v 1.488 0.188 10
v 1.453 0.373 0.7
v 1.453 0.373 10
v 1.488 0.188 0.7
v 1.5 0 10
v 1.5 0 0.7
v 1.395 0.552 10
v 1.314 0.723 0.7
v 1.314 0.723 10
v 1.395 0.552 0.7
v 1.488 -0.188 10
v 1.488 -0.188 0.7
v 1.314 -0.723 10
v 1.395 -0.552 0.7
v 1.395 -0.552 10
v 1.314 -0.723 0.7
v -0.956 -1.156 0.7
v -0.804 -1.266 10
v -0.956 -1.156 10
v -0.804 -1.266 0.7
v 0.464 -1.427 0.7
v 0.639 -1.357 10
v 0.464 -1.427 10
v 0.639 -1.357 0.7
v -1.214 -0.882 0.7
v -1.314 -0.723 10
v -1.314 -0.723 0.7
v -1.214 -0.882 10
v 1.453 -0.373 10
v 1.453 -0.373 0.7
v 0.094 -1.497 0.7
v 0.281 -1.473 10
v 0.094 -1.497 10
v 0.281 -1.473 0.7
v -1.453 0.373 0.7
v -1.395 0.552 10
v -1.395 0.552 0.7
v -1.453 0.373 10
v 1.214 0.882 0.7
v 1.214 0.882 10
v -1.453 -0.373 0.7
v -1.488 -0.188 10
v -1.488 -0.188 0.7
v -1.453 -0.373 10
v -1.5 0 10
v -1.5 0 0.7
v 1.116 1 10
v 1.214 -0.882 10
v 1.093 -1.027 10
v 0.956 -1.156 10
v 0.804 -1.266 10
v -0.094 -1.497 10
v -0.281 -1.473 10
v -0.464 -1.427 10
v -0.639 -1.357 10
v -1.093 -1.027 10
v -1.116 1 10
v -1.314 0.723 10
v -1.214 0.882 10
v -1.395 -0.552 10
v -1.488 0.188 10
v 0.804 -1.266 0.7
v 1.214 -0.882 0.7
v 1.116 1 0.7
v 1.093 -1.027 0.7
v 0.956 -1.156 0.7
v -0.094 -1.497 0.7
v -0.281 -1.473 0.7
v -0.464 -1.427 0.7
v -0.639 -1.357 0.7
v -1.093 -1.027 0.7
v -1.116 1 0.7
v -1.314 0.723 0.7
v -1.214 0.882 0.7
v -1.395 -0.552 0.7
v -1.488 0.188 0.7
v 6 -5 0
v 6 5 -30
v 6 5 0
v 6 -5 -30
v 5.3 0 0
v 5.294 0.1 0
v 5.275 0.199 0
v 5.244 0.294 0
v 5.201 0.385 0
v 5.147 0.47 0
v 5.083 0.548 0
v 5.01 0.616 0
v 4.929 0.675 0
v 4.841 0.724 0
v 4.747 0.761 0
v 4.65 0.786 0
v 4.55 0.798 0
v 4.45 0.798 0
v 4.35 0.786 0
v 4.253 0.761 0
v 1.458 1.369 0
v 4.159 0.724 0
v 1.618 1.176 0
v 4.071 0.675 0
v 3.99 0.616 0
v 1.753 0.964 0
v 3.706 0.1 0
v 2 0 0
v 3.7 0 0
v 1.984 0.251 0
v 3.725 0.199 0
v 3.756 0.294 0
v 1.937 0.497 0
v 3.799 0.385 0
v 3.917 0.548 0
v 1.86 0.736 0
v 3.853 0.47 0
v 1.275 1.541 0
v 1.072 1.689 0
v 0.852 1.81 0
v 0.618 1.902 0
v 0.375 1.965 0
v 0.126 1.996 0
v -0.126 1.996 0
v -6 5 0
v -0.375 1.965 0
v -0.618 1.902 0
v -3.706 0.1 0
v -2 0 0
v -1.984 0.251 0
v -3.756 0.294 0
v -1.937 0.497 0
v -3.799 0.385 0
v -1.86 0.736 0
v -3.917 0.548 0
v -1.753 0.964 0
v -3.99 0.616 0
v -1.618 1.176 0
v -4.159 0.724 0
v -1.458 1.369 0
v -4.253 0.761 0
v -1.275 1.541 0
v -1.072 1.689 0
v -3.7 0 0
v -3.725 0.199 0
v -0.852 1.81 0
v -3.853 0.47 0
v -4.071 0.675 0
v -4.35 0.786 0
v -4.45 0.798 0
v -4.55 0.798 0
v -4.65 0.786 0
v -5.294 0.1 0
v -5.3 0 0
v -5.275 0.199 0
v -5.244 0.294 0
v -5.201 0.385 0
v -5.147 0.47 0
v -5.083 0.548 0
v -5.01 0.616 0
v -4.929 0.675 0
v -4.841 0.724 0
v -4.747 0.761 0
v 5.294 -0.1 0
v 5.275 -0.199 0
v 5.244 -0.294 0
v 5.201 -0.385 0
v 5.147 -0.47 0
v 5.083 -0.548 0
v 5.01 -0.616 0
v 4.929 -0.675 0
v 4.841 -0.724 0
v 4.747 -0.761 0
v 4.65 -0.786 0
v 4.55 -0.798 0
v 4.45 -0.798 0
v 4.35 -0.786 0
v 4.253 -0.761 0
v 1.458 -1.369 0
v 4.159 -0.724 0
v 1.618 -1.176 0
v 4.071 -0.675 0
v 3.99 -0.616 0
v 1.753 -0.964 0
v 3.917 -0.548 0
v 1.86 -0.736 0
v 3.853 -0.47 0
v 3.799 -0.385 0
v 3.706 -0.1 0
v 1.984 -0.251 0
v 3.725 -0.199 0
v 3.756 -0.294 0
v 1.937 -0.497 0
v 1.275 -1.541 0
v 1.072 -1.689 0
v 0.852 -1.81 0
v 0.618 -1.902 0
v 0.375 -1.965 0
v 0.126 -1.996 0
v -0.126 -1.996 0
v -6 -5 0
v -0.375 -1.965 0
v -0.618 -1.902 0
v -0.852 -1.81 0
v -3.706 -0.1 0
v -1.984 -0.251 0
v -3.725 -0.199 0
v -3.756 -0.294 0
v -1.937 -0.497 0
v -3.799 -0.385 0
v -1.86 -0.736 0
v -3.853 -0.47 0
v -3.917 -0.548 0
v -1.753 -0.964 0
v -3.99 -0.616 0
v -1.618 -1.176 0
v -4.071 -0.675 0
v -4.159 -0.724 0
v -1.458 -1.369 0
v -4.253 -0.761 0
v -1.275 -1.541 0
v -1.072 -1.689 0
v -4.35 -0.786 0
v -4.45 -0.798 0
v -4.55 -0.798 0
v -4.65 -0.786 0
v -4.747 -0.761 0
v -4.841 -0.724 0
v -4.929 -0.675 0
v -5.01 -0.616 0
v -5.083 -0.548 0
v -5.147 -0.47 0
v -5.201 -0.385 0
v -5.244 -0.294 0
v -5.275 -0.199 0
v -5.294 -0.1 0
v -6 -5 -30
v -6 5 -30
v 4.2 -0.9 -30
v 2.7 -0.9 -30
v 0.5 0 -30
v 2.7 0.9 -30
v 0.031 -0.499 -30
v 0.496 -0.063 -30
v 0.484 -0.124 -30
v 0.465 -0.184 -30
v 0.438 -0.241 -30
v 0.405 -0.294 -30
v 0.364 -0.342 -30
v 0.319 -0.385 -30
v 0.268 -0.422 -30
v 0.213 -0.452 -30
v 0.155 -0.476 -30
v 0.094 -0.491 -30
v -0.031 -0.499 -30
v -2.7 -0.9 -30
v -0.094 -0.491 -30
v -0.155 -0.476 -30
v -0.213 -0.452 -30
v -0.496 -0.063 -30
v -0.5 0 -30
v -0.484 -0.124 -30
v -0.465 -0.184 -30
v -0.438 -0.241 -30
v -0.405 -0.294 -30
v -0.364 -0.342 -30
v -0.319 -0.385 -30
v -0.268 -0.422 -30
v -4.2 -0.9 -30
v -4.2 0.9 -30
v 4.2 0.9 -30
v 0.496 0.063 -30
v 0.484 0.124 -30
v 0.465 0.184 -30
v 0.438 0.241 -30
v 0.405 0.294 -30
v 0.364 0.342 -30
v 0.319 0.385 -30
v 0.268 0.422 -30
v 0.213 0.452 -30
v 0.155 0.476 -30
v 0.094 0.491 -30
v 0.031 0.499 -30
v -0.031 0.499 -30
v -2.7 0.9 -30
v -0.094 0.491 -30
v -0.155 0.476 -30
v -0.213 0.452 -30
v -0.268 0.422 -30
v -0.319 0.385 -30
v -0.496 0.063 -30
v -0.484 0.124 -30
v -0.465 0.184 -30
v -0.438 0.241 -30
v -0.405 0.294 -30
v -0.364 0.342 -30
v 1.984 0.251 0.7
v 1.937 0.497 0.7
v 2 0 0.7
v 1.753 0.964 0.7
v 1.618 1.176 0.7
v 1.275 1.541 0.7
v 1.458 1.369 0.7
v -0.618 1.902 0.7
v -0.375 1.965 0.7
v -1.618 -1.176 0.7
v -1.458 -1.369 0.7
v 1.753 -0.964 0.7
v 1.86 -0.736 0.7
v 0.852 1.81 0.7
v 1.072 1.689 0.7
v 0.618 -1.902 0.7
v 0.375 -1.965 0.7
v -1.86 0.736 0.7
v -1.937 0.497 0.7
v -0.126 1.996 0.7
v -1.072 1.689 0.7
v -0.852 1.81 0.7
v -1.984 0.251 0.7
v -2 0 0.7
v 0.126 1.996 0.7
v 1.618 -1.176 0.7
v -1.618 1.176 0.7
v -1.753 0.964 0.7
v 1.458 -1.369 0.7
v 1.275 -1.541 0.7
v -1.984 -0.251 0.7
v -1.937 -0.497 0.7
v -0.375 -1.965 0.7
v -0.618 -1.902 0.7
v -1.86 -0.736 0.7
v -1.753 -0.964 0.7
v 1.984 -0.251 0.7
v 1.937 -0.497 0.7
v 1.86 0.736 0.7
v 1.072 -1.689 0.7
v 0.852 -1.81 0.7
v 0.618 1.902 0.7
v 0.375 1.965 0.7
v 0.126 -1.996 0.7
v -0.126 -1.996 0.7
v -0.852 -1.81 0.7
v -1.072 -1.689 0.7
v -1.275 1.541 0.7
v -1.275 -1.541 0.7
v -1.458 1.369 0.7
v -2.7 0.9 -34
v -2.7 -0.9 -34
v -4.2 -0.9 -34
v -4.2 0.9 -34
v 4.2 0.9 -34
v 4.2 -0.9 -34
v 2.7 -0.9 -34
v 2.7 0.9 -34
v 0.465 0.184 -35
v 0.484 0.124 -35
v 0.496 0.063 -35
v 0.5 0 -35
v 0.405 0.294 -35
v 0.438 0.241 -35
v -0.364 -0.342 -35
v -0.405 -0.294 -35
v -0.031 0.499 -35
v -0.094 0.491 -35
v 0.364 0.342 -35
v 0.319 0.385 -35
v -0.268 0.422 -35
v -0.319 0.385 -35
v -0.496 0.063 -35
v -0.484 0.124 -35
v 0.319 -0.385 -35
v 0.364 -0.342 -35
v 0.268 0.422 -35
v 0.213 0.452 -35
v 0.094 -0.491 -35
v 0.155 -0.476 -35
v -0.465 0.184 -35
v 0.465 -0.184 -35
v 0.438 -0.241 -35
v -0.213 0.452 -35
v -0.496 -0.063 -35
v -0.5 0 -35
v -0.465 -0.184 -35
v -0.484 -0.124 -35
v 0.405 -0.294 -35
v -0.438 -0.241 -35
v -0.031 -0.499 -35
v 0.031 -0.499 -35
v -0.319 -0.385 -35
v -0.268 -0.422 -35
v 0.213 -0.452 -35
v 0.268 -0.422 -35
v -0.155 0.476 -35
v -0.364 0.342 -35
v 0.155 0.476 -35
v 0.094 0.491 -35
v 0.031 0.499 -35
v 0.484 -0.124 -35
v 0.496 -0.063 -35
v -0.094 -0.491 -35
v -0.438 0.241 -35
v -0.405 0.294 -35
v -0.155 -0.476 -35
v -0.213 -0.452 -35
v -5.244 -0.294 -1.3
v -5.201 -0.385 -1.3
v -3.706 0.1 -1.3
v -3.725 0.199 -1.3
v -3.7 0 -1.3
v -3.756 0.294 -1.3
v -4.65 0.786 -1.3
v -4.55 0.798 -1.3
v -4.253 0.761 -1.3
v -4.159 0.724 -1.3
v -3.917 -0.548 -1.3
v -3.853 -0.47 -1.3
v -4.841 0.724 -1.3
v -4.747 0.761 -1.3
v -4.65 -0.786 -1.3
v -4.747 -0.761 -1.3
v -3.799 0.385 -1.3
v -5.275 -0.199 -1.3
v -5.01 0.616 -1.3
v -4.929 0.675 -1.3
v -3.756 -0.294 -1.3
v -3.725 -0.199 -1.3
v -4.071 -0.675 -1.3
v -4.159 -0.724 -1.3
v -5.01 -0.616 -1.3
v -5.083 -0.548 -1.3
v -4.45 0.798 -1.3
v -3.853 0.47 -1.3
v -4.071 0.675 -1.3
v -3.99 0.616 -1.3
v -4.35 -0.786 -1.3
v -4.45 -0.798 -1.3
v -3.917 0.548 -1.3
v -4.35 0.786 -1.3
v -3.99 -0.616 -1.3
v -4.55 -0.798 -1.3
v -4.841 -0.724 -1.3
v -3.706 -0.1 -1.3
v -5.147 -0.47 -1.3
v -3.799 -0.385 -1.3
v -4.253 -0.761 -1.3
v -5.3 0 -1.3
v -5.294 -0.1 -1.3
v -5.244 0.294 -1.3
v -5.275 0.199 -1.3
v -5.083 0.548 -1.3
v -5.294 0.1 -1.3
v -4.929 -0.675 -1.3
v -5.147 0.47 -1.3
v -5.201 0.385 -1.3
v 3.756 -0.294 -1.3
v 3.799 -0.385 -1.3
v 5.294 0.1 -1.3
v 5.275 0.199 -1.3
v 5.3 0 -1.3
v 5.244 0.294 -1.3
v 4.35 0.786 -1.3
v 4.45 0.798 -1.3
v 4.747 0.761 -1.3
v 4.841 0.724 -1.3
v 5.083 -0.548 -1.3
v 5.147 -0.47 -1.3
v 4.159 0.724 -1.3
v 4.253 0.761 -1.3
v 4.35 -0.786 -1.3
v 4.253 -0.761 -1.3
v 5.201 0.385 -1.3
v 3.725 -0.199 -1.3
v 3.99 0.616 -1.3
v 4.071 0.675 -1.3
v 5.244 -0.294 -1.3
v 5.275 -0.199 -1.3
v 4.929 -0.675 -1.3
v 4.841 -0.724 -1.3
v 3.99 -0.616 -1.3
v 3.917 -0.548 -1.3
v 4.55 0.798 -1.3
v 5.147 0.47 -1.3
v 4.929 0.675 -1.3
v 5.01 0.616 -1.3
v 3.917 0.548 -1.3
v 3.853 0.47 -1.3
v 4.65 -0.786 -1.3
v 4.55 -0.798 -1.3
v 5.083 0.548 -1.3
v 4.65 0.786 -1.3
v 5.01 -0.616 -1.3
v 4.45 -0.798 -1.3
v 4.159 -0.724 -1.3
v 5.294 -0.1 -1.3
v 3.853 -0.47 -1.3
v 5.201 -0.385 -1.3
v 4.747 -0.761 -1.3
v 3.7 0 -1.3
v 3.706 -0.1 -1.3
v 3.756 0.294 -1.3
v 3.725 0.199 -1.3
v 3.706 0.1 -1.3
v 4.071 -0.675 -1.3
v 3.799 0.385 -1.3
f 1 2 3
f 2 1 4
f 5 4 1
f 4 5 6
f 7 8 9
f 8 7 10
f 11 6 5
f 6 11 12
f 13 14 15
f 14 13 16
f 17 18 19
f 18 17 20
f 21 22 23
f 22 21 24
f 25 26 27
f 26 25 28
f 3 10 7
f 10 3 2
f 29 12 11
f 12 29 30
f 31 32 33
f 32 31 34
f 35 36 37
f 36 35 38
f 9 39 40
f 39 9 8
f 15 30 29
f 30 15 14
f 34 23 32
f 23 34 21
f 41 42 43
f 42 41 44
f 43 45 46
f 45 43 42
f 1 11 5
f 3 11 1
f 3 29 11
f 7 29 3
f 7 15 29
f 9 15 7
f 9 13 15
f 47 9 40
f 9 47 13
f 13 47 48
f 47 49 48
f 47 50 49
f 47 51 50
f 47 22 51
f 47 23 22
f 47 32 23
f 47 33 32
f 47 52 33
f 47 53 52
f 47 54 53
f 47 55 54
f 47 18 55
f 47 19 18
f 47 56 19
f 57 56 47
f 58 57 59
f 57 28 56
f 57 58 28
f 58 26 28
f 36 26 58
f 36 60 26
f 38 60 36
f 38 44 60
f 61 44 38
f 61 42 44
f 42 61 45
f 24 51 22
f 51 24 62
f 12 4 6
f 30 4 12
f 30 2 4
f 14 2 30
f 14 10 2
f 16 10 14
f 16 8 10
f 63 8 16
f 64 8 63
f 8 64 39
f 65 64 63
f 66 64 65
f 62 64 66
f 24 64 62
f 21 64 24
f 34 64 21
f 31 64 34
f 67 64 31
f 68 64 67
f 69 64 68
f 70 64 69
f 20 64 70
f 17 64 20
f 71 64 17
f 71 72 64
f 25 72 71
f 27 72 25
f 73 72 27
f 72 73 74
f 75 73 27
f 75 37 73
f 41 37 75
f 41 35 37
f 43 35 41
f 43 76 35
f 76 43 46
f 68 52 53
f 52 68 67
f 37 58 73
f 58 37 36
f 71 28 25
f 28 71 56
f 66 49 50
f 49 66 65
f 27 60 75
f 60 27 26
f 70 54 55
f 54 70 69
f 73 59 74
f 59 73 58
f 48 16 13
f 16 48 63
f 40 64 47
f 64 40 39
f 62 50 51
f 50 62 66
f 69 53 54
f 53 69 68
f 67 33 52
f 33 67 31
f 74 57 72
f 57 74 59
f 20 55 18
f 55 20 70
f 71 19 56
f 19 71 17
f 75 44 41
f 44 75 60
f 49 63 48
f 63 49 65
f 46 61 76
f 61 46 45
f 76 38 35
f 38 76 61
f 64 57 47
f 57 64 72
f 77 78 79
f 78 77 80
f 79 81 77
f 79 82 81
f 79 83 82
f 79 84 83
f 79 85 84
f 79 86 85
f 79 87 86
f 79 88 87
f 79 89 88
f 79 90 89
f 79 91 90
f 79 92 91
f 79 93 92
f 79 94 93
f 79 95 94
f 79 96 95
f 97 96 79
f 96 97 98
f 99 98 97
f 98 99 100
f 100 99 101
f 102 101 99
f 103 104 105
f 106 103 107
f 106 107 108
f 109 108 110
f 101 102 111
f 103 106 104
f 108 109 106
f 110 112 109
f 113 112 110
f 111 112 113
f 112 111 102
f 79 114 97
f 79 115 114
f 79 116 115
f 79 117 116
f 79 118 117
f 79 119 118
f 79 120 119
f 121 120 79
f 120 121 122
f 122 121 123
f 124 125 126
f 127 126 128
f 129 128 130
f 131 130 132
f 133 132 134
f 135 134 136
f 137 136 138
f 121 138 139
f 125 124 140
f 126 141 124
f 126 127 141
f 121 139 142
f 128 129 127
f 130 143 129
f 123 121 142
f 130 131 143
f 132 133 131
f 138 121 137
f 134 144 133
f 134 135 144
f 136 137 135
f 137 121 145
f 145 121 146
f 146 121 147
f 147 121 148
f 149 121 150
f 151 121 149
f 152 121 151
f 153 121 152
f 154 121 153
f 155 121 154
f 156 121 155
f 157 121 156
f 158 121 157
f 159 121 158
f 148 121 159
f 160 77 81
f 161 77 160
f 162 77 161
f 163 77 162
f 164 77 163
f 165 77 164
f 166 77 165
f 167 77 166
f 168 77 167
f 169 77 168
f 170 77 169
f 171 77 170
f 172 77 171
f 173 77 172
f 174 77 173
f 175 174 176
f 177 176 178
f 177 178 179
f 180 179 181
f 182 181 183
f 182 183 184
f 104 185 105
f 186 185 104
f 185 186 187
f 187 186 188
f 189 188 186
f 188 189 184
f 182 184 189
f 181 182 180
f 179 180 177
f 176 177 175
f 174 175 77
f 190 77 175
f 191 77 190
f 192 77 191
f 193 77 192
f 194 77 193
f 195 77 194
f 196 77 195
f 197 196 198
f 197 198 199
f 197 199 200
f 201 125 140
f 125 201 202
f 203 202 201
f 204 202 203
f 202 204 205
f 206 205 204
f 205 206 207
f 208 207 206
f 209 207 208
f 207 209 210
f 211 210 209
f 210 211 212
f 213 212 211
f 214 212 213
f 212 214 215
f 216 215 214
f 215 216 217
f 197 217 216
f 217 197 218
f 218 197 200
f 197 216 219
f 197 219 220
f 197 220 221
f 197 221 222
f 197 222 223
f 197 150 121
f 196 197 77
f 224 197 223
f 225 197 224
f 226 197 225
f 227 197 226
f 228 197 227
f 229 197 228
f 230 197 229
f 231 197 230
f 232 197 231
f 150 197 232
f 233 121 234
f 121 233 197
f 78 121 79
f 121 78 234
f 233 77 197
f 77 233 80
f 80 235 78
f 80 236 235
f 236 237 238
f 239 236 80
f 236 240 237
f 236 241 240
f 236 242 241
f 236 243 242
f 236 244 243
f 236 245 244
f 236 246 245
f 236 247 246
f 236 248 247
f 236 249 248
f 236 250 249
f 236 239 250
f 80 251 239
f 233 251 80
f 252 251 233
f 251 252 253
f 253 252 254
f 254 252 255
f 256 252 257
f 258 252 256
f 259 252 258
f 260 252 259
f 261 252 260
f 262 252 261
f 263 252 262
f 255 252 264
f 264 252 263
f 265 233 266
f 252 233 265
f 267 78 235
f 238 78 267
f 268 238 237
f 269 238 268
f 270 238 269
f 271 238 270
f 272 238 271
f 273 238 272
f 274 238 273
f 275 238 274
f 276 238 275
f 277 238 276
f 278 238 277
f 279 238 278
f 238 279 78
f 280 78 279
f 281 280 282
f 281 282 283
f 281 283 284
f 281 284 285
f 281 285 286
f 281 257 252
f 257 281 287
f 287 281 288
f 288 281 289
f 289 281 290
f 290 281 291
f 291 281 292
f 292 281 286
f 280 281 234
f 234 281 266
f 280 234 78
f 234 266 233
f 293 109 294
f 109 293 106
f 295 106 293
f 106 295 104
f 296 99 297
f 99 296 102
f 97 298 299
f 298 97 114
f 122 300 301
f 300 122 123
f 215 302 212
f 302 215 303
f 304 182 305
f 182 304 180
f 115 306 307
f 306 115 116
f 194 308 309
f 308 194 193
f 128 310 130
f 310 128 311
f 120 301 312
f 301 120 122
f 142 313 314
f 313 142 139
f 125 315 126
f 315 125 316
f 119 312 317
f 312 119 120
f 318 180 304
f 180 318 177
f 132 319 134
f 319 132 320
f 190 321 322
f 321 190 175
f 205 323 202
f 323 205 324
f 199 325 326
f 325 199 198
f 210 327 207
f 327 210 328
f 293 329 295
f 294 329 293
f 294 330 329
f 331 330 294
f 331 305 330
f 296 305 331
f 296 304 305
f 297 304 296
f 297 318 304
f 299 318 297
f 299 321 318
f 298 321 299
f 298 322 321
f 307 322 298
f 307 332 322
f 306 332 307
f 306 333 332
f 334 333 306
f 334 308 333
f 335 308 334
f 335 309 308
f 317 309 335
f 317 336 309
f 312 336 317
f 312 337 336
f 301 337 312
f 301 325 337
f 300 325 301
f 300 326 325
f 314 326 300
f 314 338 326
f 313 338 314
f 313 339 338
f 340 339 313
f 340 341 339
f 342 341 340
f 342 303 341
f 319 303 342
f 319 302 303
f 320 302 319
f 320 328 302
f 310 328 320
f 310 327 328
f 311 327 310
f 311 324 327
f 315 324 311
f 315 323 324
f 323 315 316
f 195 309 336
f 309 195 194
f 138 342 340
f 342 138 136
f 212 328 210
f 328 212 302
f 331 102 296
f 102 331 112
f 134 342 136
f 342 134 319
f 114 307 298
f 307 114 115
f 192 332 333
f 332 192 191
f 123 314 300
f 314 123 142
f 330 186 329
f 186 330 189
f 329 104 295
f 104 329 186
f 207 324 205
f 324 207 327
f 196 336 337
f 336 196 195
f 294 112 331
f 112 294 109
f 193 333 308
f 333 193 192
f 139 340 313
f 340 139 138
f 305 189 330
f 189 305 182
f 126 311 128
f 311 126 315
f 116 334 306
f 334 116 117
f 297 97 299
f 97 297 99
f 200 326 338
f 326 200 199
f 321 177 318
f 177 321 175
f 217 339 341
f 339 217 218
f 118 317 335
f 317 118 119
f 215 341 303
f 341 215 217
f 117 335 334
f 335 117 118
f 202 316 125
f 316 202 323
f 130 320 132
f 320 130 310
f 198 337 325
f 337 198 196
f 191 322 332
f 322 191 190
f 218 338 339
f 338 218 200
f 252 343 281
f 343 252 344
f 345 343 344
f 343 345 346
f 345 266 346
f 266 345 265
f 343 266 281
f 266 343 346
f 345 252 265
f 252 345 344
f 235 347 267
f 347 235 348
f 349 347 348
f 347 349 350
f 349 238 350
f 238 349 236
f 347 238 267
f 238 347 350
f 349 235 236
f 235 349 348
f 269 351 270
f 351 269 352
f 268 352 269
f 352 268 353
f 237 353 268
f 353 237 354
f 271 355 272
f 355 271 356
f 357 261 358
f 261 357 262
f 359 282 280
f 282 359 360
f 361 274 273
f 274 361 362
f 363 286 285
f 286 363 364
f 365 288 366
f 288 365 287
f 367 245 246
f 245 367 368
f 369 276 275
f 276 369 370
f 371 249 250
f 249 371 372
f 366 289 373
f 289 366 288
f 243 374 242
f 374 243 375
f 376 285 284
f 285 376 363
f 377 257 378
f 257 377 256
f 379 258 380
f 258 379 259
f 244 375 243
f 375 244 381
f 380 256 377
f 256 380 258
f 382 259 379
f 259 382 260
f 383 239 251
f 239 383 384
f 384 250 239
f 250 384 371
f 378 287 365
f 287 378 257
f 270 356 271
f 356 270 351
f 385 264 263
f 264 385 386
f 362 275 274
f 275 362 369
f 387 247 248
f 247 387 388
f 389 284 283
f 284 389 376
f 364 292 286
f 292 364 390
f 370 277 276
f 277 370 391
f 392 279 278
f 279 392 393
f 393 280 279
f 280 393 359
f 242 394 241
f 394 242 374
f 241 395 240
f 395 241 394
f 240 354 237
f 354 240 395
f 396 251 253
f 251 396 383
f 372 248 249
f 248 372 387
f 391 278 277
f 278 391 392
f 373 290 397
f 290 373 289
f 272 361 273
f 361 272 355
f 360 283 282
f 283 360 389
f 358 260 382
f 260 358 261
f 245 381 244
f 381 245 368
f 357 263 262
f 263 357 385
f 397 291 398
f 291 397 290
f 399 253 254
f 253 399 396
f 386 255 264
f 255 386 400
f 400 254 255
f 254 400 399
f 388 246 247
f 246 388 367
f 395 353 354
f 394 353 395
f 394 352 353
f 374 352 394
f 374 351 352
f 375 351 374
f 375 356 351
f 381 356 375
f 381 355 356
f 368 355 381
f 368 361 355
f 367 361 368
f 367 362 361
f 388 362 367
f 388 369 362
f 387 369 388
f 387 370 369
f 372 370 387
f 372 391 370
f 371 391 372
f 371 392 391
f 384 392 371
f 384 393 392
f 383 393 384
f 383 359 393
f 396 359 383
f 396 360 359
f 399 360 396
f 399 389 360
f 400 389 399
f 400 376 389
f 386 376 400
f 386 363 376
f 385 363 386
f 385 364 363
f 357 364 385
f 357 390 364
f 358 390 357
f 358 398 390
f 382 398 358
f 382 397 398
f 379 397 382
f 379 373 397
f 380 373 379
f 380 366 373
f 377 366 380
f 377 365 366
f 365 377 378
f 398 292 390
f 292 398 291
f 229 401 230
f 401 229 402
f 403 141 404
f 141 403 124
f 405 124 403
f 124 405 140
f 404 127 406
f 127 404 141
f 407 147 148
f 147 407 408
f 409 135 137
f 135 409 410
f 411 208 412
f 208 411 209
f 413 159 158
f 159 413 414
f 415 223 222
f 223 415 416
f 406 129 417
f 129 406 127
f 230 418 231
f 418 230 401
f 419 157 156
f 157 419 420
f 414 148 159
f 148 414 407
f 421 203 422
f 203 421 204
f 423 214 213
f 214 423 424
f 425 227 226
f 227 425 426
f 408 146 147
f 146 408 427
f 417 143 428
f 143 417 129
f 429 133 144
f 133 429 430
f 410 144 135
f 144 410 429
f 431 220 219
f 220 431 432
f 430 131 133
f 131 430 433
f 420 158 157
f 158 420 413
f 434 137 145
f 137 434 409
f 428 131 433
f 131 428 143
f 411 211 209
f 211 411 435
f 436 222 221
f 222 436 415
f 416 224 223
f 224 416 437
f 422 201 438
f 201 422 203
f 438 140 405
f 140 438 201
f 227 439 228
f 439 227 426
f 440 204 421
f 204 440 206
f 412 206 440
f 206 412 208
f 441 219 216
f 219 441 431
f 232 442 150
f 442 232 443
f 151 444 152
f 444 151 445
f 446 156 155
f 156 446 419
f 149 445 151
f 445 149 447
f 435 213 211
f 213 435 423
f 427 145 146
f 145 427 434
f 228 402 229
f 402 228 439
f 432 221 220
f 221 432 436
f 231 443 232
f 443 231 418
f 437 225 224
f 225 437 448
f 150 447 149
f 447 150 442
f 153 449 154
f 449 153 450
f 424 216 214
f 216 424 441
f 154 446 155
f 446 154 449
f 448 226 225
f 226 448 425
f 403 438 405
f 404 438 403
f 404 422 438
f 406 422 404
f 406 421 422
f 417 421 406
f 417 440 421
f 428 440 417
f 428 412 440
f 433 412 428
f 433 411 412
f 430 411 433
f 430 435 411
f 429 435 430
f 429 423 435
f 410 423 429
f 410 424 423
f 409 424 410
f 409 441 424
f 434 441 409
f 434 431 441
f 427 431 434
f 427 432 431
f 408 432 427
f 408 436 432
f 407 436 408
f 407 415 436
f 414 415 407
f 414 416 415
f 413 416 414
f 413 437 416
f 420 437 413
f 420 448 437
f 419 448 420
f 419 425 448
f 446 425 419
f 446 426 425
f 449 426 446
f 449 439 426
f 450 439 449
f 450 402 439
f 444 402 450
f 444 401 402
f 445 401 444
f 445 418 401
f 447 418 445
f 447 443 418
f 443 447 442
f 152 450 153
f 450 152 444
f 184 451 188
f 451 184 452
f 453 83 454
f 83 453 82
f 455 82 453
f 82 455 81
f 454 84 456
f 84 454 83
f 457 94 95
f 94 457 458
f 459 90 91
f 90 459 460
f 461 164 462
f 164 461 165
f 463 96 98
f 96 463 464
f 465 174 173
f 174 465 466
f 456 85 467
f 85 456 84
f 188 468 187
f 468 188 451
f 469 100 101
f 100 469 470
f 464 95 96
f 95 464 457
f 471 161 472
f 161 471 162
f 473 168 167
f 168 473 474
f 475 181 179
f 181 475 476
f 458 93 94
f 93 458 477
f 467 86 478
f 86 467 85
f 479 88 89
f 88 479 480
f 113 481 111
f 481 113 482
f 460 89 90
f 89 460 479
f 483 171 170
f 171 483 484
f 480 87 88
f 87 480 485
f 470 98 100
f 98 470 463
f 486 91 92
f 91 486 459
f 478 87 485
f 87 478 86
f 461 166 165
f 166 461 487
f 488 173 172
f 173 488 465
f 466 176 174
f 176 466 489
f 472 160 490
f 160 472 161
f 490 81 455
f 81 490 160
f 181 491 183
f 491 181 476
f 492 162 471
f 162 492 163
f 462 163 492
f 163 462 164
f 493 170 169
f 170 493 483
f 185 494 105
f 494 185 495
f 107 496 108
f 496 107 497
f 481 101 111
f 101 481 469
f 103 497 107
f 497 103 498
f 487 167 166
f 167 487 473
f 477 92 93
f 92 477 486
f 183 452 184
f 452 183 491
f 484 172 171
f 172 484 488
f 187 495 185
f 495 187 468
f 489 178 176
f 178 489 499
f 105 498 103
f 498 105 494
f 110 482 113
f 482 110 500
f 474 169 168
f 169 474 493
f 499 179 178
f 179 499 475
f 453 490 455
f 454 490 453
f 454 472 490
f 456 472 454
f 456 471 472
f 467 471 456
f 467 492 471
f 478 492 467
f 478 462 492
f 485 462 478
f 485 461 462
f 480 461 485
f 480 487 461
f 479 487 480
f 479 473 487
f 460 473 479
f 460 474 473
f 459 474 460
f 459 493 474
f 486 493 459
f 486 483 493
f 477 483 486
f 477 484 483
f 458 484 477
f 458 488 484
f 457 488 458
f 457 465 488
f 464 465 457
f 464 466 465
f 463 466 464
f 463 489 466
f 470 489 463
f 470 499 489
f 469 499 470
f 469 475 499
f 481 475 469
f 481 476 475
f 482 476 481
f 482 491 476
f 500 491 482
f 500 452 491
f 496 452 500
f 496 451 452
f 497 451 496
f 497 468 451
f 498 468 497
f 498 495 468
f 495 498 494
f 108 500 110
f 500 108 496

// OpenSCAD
$fn = 50;

difference() {
	union() {
		translate(v = [0, 0, 0.7]) {
			rotate(a = [0, 0, 0]) {
				difference() {
					union() {
						cylinder(h = 9.3, r = 1.5);
					}
					union() {
						translate(v = [-6.0, 1.0, -1]) {
							cube(size = [12, 12, 11.3]);
						}
					}
				}
			}
		}
		translate(v = [-6.0, -5.0, -9]) {
			cube(size = [12, 10, 9]);
		}
		translate(v = [-6.0, -5.0, -30]) {
			cube(size = [12, 10, 21]);
		}
		cylinder(h = 0.7, r = 2.0);
		translate(v = [-4.2, -0.9, -34]) {
			cube(size = [1.5, 1.8, 4]);
		}
		translate(v = [2.7, -0.9, -34]) {
			cube(size = [1.5, 1.8, 4]);
		}
		translate(v = [0, 0, -35.0]) {
			cylinder(h = 5, r = 0.5);
		}
	}
	union() {
		translate(v = [-4.5, 0, -1.3]) {
			cylinder(h = 1.31, r = 0.8);
		}
		translate(v = [4.5, 0, -1.3]) {
			cylinder(h = 1.31, r = 0.8);
		}
	}
}
